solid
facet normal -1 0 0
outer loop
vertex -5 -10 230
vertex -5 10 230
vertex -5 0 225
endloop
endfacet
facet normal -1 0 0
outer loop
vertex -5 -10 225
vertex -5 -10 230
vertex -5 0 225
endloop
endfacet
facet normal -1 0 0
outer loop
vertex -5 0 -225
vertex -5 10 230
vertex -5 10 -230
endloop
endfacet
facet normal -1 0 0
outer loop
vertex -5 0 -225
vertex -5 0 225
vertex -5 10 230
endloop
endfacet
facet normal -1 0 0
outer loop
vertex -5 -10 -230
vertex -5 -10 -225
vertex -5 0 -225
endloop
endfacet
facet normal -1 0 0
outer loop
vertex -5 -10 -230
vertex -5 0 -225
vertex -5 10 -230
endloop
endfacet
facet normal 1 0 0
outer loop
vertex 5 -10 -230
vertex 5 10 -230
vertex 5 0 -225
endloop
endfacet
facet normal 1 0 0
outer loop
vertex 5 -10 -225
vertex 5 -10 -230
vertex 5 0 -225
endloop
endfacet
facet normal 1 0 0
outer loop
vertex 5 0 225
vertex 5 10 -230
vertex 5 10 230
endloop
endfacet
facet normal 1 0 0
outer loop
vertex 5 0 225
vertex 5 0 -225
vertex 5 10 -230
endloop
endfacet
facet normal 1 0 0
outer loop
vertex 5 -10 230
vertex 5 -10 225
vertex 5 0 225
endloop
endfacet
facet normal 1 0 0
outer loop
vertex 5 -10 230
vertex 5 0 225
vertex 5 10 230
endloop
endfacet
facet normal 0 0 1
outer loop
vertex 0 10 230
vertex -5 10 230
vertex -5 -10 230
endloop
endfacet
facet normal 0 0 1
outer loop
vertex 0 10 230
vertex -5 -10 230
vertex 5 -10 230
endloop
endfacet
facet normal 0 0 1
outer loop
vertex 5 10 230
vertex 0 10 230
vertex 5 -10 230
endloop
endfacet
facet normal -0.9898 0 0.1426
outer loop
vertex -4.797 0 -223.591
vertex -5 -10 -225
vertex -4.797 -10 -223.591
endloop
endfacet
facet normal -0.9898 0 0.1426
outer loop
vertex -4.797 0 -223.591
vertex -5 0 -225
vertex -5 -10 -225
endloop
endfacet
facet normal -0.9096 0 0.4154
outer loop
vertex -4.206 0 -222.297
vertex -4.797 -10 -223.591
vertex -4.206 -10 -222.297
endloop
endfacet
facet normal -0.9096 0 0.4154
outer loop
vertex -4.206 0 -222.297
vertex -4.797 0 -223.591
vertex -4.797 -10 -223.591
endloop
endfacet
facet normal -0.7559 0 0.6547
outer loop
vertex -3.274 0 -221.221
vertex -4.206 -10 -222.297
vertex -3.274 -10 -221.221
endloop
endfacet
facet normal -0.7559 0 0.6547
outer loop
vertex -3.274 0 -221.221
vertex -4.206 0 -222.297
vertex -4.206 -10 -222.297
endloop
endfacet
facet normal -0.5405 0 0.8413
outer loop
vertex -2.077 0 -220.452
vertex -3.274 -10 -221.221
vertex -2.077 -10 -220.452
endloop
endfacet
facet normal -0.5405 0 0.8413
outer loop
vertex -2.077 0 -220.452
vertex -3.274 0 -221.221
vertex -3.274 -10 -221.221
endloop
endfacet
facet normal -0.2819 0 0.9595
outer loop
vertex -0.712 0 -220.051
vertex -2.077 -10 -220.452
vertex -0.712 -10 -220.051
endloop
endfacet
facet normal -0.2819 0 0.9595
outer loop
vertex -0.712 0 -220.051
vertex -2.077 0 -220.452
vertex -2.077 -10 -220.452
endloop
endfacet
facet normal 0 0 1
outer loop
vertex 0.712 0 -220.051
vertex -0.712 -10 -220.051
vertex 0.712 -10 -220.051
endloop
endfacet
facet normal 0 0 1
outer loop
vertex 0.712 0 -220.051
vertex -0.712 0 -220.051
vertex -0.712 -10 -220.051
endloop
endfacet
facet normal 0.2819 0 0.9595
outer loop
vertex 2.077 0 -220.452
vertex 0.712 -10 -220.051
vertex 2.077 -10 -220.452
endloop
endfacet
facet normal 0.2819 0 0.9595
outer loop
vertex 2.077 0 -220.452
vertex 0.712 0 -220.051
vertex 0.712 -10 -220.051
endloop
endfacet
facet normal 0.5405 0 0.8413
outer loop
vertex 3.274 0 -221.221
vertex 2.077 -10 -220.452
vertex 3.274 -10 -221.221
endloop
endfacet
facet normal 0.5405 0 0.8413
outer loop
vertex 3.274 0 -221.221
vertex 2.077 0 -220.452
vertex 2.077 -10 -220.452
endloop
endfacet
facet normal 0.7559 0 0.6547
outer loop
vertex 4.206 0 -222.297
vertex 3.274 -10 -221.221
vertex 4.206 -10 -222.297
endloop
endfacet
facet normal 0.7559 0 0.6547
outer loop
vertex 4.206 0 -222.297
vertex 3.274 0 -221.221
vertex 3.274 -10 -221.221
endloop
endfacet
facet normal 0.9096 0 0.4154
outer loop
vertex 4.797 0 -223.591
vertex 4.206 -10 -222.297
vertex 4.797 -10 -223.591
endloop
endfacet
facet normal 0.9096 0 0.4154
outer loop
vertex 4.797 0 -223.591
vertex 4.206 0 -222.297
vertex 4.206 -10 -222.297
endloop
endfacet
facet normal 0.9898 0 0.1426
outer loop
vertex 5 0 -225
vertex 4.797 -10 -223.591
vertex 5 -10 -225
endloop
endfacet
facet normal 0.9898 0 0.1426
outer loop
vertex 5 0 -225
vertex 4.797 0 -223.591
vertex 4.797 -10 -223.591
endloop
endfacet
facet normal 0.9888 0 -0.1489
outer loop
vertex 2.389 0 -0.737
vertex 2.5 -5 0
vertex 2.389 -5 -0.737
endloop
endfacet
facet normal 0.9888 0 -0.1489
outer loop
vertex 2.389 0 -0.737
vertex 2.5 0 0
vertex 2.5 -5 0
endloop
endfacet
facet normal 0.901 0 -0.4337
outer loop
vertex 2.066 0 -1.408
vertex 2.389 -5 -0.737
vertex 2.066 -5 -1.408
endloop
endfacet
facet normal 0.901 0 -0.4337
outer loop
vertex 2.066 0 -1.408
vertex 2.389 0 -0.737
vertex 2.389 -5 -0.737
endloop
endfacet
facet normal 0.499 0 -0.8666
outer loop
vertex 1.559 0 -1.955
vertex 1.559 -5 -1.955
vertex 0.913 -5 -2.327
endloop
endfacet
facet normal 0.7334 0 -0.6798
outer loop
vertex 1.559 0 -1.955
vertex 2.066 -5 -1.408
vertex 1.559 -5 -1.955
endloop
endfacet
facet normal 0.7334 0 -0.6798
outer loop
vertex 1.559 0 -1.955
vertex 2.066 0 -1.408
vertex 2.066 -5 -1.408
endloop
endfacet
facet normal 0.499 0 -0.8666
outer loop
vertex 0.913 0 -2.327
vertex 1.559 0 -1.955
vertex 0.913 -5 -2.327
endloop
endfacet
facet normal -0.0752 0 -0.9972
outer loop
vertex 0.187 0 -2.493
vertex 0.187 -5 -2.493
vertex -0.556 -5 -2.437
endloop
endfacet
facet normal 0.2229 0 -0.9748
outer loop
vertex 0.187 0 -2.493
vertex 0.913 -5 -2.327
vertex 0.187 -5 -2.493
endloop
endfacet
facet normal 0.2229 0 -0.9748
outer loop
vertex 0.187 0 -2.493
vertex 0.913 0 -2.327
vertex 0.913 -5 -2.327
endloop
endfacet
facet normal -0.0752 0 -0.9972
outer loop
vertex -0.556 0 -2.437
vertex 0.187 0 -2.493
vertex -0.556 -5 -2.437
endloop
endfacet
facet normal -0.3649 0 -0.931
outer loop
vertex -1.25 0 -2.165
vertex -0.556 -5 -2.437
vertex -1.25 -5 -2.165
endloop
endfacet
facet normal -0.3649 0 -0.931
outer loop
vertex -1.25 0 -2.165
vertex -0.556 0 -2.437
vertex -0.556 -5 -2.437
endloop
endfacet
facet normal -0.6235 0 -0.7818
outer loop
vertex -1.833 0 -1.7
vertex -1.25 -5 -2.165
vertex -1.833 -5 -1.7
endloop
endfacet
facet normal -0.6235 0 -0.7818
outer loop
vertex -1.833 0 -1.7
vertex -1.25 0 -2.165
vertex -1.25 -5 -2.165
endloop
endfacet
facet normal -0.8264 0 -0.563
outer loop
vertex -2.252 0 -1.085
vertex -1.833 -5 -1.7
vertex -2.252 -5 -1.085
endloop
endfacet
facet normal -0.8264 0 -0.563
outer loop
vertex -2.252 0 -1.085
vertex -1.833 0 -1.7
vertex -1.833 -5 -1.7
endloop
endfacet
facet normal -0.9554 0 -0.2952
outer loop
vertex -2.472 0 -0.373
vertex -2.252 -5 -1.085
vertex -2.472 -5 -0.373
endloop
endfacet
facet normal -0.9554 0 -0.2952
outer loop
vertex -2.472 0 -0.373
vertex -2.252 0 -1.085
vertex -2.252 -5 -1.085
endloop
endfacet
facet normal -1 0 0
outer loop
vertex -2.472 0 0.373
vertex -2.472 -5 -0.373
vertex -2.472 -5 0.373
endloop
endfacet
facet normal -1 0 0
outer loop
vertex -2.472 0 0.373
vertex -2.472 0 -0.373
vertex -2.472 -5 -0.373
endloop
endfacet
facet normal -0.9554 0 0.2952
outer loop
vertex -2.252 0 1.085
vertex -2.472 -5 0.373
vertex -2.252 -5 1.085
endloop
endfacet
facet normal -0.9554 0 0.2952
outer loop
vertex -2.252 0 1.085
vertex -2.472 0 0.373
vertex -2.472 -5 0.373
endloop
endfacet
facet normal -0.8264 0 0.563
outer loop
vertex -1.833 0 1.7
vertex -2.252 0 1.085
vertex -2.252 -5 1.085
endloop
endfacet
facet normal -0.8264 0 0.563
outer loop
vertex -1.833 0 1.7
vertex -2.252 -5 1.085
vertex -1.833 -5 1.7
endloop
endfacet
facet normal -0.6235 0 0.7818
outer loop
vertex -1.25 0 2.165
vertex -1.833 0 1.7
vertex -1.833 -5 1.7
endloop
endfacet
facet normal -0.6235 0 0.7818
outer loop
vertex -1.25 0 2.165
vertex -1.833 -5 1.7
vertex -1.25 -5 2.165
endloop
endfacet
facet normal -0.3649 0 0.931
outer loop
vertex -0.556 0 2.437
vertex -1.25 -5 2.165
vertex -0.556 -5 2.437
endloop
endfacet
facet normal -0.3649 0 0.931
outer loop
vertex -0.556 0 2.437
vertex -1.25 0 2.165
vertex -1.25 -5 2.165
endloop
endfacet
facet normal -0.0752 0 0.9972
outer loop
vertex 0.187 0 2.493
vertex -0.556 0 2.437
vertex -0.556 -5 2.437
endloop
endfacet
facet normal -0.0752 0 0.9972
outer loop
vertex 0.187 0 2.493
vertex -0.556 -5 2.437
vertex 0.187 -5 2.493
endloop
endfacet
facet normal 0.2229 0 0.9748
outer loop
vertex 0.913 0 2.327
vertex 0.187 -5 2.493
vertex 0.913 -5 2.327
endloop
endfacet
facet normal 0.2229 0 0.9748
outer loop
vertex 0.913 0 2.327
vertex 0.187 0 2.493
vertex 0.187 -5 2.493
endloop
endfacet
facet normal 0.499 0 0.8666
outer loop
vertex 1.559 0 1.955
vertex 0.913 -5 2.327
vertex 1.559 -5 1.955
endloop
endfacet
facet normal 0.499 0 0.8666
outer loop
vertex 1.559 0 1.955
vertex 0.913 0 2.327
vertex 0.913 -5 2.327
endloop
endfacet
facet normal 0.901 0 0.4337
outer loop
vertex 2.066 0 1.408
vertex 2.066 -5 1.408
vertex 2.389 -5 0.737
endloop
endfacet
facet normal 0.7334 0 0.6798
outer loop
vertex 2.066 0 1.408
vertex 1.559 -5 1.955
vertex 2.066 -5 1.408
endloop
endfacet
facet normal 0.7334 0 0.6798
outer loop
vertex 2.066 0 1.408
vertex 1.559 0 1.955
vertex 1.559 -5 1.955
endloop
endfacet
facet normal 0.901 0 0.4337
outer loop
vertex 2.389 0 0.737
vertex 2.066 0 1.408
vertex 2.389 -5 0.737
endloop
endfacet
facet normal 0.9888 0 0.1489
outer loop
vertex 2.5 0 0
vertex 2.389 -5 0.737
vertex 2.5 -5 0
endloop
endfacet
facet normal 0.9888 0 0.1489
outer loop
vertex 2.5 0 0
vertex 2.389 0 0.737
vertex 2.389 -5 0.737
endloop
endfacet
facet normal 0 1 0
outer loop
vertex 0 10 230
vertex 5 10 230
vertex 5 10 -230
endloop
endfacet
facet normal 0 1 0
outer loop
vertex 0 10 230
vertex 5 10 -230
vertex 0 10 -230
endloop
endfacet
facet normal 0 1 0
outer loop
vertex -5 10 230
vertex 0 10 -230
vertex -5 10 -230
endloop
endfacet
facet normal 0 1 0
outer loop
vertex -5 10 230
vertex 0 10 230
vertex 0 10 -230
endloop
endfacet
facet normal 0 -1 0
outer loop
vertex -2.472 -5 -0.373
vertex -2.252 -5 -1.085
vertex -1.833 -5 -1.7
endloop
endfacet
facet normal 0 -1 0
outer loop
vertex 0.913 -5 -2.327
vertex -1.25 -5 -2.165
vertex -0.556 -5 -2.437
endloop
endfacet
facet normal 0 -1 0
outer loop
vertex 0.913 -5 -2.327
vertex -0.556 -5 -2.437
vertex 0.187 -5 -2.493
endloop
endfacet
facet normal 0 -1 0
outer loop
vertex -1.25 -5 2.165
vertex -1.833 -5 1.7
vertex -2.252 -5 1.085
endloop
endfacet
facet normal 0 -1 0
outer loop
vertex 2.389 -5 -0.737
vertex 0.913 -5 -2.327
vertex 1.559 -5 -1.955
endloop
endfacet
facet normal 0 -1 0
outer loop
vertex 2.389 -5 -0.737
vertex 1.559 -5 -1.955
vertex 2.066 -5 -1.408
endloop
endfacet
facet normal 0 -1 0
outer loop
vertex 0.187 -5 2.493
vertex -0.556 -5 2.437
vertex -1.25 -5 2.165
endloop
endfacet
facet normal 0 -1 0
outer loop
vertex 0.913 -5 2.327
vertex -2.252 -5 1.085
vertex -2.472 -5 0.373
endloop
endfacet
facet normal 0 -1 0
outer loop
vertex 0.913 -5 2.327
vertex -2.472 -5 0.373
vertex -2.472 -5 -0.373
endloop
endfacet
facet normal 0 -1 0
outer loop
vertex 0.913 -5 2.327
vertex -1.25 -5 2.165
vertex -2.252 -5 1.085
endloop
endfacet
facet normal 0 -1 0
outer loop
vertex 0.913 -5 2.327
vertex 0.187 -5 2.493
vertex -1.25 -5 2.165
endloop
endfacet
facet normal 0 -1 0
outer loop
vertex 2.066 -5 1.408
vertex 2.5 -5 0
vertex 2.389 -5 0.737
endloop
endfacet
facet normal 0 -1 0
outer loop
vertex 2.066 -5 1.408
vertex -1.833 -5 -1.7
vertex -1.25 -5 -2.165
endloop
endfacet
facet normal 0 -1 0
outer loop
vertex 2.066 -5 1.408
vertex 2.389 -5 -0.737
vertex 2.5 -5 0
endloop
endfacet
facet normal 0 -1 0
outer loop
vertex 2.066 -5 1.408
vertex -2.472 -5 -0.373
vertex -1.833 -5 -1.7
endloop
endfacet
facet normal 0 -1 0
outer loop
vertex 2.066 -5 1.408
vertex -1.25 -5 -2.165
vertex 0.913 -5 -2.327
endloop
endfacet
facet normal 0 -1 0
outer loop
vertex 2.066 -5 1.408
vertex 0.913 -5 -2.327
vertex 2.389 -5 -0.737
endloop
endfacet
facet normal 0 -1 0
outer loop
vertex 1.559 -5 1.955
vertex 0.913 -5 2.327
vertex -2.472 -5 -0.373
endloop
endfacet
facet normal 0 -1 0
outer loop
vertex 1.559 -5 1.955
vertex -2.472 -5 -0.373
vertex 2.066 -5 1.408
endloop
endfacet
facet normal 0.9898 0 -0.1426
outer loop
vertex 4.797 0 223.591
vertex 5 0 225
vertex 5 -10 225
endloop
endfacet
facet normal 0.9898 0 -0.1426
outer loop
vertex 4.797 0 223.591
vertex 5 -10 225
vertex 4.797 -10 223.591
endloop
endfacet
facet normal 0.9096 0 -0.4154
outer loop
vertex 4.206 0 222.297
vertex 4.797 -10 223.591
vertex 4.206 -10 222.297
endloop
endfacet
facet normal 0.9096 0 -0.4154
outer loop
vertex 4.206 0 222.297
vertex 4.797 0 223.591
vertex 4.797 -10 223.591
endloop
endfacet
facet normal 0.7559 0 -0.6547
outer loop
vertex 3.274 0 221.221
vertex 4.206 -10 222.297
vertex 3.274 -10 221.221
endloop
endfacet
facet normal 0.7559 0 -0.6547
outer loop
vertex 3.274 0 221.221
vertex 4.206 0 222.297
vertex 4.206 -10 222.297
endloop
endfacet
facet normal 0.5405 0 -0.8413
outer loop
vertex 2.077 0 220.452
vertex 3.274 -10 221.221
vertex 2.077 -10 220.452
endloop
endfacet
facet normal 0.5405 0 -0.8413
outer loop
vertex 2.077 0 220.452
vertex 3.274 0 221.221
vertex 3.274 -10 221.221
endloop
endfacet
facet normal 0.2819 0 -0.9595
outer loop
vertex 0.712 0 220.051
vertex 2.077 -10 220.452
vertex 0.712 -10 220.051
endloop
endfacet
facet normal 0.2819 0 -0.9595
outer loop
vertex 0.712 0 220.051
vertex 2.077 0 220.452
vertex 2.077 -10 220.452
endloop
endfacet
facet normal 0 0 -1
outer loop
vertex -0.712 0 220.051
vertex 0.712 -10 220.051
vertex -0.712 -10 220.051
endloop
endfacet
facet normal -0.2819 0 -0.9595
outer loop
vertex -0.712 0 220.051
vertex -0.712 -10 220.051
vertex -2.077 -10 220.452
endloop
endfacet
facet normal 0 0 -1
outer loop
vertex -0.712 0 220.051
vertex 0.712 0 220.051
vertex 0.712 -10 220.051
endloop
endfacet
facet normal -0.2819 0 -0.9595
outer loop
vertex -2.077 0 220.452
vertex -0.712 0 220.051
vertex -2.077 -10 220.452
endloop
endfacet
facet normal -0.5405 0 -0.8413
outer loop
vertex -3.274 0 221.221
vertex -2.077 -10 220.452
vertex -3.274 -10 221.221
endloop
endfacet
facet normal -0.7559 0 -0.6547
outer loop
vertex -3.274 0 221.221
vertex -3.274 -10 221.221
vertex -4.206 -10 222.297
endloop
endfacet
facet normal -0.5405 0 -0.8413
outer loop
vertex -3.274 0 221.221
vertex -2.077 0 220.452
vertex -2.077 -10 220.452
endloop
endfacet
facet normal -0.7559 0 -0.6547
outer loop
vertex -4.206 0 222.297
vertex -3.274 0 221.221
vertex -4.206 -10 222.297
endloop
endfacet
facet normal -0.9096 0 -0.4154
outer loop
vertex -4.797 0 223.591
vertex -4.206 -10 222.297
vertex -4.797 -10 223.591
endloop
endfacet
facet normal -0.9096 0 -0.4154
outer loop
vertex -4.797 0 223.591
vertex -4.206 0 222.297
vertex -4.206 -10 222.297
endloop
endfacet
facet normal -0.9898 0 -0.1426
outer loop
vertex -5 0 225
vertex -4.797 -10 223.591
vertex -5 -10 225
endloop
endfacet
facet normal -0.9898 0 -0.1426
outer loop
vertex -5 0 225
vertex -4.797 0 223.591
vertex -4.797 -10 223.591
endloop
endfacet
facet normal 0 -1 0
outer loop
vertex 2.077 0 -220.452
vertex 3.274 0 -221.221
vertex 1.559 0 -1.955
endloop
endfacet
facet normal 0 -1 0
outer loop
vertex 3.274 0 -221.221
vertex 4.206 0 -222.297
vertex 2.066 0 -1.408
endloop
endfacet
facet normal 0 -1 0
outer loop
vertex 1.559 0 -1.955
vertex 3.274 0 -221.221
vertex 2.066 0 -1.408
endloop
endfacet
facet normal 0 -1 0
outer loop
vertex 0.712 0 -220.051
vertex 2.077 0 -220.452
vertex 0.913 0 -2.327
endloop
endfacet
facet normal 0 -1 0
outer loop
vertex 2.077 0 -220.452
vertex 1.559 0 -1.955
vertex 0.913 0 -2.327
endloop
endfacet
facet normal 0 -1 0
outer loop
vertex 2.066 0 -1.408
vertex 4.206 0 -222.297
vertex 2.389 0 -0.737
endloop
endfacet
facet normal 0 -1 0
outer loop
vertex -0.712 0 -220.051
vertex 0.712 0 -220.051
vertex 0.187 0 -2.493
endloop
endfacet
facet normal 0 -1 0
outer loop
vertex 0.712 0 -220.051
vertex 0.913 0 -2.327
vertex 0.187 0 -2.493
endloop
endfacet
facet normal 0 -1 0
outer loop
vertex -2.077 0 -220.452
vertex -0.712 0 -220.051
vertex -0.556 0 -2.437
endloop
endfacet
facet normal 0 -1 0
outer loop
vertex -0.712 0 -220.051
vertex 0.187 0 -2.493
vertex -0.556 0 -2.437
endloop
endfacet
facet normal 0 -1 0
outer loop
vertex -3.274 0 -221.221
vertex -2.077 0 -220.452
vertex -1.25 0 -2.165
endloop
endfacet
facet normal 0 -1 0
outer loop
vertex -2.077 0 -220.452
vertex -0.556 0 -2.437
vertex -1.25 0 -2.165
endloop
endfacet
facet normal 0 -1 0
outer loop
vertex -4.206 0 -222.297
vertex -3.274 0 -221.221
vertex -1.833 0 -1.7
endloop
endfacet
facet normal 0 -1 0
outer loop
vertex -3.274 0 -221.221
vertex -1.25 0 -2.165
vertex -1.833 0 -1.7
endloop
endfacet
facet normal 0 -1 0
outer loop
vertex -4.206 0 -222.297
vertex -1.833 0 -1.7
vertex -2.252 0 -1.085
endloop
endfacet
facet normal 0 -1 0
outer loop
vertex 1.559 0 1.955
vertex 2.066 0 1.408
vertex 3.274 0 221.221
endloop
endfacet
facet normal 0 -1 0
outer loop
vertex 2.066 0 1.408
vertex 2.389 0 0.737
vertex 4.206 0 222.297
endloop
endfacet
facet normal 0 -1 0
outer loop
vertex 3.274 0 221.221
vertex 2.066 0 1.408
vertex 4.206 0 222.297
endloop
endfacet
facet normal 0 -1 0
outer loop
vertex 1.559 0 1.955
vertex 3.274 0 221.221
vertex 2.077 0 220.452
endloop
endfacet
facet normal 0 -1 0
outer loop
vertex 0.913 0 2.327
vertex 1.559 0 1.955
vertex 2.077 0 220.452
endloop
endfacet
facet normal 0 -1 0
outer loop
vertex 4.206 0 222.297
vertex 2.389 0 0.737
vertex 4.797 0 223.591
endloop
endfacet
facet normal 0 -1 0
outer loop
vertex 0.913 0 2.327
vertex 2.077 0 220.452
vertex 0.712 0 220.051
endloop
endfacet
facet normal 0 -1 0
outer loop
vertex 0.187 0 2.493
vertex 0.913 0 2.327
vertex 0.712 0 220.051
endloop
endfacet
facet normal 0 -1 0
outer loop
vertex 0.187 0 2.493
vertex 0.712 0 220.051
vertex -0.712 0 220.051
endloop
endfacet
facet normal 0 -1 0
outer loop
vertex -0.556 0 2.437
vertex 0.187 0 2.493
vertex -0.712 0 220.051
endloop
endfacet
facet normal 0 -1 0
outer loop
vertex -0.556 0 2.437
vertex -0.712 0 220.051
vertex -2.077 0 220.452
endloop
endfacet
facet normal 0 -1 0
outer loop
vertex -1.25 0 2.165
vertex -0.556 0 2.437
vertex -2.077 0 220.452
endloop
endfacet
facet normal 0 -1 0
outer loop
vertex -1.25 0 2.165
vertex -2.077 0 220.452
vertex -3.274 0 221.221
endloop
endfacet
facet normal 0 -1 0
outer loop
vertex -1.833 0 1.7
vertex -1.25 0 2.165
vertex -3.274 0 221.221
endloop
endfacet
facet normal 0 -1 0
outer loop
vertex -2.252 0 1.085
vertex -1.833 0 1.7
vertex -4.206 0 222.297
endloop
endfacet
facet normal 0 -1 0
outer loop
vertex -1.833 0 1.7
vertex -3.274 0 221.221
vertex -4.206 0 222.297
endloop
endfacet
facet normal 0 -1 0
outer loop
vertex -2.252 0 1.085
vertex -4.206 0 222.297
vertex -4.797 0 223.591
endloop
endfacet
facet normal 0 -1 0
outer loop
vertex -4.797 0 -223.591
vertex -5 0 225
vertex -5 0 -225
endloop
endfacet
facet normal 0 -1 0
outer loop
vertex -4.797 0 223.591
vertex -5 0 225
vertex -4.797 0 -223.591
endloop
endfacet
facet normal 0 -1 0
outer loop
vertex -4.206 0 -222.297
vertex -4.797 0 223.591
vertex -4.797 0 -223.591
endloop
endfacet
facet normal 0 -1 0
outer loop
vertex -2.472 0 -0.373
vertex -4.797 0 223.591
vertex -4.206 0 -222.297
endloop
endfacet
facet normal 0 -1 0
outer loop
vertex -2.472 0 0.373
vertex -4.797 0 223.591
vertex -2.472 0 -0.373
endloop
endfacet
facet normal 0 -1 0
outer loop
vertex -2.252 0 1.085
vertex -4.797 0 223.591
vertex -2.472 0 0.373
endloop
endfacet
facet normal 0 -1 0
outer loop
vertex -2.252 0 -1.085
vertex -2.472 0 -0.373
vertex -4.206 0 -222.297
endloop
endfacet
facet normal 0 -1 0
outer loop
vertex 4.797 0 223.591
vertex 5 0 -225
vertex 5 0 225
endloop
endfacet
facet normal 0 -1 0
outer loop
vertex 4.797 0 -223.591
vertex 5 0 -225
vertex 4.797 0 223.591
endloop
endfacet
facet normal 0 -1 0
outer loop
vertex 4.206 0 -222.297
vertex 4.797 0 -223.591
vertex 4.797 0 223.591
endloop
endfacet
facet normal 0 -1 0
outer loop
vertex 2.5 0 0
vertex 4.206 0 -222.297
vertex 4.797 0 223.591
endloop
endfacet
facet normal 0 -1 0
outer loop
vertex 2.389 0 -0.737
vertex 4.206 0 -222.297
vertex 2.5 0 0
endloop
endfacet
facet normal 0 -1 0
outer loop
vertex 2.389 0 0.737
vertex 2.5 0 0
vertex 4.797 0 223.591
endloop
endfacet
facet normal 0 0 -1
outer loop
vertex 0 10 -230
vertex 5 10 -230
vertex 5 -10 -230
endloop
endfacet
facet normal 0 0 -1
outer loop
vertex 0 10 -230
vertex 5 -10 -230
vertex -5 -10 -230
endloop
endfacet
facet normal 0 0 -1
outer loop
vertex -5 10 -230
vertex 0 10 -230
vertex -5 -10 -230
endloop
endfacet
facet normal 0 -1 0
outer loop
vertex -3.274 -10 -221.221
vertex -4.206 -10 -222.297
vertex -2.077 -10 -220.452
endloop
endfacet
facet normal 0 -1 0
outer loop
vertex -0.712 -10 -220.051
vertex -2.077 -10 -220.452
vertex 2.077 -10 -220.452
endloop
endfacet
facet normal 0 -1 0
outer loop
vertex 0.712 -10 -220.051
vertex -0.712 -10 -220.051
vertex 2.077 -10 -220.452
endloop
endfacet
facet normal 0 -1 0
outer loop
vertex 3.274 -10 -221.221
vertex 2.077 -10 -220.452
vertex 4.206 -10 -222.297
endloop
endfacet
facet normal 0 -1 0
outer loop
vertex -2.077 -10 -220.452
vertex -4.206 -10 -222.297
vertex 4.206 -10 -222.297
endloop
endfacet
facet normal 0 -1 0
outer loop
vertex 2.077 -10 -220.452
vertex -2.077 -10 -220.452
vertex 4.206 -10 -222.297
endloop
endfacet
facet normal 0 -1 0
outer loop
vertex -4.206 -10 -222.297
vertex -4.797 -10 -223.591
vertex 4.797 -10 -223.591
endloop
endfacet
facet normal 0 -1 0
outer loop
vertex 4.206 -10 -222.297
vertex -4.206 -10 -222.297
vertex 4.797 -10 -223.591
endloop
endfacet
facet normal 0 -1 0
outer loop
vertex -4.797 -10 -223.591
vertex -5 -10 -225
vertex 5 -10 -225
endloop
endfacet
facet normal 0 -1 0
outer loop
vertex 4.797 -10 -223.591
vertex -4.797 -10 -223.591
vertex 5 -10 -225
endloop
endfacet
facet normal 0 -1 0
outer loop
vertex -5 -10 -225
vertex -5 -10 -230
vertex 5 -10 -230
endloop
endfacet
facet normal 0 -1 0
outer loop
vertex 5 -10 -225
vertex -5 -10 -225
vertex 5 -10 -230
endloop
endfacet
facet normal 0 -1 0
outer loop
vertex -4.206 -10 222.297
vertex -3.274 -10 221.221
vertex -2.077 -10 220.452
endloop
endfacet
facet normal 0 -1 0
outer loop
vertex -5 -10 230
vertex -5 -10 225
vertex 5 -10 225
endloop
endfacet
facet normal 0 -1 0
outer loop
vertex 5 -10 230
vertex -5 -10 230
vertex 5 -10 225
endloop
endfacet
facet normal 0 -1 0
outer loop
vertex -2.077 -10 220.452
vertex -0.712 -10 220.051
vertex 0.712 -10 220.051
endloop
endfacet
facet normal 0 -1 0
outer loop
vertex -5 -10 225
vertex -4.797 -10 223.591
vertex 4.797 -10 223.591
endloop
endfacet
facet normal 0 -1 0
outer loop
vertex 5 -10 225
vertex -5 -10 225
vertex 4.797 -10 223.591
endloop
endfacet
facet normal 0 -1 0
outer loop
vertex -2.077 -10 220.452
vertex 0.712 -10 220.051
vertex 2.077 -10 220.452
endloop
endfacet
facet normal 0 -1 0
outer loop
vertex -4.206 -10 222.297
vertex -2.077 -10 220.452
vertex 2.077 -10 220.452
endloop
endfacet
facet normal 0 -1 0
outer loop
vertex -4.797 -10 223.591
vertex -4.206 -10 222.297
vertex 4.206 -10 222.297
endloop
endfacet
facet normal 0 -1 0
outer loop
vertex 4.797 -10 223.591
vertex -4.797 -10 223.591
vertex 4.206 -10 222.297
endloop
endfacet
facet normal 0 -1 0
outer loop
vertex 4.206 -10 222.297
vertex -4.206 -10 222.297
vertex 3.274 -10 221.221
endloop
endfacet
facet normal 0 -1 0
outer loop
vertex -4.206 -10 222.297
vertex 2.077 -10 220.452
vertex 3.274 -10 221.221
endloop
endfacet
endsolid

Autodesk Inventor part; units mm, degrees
ref_plane "YZ Plane" through (0, 0, 0) normal (1, 0, 0) x (0, 1, 0)
ref_plane "XZ Plane" through (0, 0, 0) normal (0, 1, 0) x (-1, 0, 0)
ref_plane "XY Plane" through (0, 0, 0) normal (0, 0, 1) x (1, 0, 0)
sketch "Sketch1" plane through (0, 0, 0) normal (0, 1, 0) x (-1, 0, 0)
  line L0 (0, 225) -> (0, -225) construction
  line L1 (5, 225) -> (5, -225)
  line L2 (-5, -225) -> (-5, 225)
  arc A0 (5, 225) -> (-5, 225) centre (0, 225) ccw
  arc A1 (-5, -225) -> (5, -225) centre (0, -225) ccw
  circle A2 centre (0, 0) radius 2.5
  dimension "d0" = 450
  dimension "d1" = 10
  dimension "d2" = 5
extrude "Extrusion1" add sketch "Sketch1" along normal blind 10 contours L1 A1 L2 A0 | A2
sketch "Sketch2" plane through (0, 0, 0) normal (0, -1, 0) x (1, 0, 0)
  circle A0 centre (0, 0) radius 2.5
  dimension "d5" = 5
extrude "Extrusion2" add sketch "Sketch2" along normal blind 5
sketch "Sketch3" plane through (0, 10, 0) normal (0, 1, 0) x (1, 0, 0)
  line L0 (-5, 225) -> (-5, -225) projected
  arc A0 (-5, -225) -> (5, -225) centre (0, -225) ccw projected
  line L1 (5, -225) -> (5, 225) projected
  arc A1 (5, 225) -> (-5, 225) centre (0, 225) ccw projected
  circle A2 centre (0, -225) radius 5
  circle A3 centre (0, 225) radius 5
  line L2 (-5, -230) -> (5, -230)
  line L3 (5, -230) -> (5, -220)
  line L4 (5, -220) -> (-5, -220)
  line L5 (-5, -220) -> (-5, -230)
  line L6 (-5, 225) -> (-5, -225) projected
  line L7 (-5, 220) -> (5, 220)
  line L8 (5, 220) -> (5, 230)
  line L9 (5, 230) -> (-5, 230)
  line L10 (-5, 230) -> (-5, 220)
  point P0 (0, 0)
  point P1 (5, 225)
  point P2 (5, -225)
  point P3 (-5, -225)
  point P4 (0, 230)
  point P5 (5, 225)
  point P6 (-5, -225)
  point P7 (0, -230)
  point P8 (5, -225)
  dimension "d8" = 10
  dimension "d9" = 10
extrude "Extrusion3" add sketch "Sketch3" against normal blind 20 contours L10 L9 A1 | A1 A3 | L9 L8 A1 | A2 A0 | A0 L2 L5 | A0 L3 L2
properties part number "McCrea_otočka_walle"
